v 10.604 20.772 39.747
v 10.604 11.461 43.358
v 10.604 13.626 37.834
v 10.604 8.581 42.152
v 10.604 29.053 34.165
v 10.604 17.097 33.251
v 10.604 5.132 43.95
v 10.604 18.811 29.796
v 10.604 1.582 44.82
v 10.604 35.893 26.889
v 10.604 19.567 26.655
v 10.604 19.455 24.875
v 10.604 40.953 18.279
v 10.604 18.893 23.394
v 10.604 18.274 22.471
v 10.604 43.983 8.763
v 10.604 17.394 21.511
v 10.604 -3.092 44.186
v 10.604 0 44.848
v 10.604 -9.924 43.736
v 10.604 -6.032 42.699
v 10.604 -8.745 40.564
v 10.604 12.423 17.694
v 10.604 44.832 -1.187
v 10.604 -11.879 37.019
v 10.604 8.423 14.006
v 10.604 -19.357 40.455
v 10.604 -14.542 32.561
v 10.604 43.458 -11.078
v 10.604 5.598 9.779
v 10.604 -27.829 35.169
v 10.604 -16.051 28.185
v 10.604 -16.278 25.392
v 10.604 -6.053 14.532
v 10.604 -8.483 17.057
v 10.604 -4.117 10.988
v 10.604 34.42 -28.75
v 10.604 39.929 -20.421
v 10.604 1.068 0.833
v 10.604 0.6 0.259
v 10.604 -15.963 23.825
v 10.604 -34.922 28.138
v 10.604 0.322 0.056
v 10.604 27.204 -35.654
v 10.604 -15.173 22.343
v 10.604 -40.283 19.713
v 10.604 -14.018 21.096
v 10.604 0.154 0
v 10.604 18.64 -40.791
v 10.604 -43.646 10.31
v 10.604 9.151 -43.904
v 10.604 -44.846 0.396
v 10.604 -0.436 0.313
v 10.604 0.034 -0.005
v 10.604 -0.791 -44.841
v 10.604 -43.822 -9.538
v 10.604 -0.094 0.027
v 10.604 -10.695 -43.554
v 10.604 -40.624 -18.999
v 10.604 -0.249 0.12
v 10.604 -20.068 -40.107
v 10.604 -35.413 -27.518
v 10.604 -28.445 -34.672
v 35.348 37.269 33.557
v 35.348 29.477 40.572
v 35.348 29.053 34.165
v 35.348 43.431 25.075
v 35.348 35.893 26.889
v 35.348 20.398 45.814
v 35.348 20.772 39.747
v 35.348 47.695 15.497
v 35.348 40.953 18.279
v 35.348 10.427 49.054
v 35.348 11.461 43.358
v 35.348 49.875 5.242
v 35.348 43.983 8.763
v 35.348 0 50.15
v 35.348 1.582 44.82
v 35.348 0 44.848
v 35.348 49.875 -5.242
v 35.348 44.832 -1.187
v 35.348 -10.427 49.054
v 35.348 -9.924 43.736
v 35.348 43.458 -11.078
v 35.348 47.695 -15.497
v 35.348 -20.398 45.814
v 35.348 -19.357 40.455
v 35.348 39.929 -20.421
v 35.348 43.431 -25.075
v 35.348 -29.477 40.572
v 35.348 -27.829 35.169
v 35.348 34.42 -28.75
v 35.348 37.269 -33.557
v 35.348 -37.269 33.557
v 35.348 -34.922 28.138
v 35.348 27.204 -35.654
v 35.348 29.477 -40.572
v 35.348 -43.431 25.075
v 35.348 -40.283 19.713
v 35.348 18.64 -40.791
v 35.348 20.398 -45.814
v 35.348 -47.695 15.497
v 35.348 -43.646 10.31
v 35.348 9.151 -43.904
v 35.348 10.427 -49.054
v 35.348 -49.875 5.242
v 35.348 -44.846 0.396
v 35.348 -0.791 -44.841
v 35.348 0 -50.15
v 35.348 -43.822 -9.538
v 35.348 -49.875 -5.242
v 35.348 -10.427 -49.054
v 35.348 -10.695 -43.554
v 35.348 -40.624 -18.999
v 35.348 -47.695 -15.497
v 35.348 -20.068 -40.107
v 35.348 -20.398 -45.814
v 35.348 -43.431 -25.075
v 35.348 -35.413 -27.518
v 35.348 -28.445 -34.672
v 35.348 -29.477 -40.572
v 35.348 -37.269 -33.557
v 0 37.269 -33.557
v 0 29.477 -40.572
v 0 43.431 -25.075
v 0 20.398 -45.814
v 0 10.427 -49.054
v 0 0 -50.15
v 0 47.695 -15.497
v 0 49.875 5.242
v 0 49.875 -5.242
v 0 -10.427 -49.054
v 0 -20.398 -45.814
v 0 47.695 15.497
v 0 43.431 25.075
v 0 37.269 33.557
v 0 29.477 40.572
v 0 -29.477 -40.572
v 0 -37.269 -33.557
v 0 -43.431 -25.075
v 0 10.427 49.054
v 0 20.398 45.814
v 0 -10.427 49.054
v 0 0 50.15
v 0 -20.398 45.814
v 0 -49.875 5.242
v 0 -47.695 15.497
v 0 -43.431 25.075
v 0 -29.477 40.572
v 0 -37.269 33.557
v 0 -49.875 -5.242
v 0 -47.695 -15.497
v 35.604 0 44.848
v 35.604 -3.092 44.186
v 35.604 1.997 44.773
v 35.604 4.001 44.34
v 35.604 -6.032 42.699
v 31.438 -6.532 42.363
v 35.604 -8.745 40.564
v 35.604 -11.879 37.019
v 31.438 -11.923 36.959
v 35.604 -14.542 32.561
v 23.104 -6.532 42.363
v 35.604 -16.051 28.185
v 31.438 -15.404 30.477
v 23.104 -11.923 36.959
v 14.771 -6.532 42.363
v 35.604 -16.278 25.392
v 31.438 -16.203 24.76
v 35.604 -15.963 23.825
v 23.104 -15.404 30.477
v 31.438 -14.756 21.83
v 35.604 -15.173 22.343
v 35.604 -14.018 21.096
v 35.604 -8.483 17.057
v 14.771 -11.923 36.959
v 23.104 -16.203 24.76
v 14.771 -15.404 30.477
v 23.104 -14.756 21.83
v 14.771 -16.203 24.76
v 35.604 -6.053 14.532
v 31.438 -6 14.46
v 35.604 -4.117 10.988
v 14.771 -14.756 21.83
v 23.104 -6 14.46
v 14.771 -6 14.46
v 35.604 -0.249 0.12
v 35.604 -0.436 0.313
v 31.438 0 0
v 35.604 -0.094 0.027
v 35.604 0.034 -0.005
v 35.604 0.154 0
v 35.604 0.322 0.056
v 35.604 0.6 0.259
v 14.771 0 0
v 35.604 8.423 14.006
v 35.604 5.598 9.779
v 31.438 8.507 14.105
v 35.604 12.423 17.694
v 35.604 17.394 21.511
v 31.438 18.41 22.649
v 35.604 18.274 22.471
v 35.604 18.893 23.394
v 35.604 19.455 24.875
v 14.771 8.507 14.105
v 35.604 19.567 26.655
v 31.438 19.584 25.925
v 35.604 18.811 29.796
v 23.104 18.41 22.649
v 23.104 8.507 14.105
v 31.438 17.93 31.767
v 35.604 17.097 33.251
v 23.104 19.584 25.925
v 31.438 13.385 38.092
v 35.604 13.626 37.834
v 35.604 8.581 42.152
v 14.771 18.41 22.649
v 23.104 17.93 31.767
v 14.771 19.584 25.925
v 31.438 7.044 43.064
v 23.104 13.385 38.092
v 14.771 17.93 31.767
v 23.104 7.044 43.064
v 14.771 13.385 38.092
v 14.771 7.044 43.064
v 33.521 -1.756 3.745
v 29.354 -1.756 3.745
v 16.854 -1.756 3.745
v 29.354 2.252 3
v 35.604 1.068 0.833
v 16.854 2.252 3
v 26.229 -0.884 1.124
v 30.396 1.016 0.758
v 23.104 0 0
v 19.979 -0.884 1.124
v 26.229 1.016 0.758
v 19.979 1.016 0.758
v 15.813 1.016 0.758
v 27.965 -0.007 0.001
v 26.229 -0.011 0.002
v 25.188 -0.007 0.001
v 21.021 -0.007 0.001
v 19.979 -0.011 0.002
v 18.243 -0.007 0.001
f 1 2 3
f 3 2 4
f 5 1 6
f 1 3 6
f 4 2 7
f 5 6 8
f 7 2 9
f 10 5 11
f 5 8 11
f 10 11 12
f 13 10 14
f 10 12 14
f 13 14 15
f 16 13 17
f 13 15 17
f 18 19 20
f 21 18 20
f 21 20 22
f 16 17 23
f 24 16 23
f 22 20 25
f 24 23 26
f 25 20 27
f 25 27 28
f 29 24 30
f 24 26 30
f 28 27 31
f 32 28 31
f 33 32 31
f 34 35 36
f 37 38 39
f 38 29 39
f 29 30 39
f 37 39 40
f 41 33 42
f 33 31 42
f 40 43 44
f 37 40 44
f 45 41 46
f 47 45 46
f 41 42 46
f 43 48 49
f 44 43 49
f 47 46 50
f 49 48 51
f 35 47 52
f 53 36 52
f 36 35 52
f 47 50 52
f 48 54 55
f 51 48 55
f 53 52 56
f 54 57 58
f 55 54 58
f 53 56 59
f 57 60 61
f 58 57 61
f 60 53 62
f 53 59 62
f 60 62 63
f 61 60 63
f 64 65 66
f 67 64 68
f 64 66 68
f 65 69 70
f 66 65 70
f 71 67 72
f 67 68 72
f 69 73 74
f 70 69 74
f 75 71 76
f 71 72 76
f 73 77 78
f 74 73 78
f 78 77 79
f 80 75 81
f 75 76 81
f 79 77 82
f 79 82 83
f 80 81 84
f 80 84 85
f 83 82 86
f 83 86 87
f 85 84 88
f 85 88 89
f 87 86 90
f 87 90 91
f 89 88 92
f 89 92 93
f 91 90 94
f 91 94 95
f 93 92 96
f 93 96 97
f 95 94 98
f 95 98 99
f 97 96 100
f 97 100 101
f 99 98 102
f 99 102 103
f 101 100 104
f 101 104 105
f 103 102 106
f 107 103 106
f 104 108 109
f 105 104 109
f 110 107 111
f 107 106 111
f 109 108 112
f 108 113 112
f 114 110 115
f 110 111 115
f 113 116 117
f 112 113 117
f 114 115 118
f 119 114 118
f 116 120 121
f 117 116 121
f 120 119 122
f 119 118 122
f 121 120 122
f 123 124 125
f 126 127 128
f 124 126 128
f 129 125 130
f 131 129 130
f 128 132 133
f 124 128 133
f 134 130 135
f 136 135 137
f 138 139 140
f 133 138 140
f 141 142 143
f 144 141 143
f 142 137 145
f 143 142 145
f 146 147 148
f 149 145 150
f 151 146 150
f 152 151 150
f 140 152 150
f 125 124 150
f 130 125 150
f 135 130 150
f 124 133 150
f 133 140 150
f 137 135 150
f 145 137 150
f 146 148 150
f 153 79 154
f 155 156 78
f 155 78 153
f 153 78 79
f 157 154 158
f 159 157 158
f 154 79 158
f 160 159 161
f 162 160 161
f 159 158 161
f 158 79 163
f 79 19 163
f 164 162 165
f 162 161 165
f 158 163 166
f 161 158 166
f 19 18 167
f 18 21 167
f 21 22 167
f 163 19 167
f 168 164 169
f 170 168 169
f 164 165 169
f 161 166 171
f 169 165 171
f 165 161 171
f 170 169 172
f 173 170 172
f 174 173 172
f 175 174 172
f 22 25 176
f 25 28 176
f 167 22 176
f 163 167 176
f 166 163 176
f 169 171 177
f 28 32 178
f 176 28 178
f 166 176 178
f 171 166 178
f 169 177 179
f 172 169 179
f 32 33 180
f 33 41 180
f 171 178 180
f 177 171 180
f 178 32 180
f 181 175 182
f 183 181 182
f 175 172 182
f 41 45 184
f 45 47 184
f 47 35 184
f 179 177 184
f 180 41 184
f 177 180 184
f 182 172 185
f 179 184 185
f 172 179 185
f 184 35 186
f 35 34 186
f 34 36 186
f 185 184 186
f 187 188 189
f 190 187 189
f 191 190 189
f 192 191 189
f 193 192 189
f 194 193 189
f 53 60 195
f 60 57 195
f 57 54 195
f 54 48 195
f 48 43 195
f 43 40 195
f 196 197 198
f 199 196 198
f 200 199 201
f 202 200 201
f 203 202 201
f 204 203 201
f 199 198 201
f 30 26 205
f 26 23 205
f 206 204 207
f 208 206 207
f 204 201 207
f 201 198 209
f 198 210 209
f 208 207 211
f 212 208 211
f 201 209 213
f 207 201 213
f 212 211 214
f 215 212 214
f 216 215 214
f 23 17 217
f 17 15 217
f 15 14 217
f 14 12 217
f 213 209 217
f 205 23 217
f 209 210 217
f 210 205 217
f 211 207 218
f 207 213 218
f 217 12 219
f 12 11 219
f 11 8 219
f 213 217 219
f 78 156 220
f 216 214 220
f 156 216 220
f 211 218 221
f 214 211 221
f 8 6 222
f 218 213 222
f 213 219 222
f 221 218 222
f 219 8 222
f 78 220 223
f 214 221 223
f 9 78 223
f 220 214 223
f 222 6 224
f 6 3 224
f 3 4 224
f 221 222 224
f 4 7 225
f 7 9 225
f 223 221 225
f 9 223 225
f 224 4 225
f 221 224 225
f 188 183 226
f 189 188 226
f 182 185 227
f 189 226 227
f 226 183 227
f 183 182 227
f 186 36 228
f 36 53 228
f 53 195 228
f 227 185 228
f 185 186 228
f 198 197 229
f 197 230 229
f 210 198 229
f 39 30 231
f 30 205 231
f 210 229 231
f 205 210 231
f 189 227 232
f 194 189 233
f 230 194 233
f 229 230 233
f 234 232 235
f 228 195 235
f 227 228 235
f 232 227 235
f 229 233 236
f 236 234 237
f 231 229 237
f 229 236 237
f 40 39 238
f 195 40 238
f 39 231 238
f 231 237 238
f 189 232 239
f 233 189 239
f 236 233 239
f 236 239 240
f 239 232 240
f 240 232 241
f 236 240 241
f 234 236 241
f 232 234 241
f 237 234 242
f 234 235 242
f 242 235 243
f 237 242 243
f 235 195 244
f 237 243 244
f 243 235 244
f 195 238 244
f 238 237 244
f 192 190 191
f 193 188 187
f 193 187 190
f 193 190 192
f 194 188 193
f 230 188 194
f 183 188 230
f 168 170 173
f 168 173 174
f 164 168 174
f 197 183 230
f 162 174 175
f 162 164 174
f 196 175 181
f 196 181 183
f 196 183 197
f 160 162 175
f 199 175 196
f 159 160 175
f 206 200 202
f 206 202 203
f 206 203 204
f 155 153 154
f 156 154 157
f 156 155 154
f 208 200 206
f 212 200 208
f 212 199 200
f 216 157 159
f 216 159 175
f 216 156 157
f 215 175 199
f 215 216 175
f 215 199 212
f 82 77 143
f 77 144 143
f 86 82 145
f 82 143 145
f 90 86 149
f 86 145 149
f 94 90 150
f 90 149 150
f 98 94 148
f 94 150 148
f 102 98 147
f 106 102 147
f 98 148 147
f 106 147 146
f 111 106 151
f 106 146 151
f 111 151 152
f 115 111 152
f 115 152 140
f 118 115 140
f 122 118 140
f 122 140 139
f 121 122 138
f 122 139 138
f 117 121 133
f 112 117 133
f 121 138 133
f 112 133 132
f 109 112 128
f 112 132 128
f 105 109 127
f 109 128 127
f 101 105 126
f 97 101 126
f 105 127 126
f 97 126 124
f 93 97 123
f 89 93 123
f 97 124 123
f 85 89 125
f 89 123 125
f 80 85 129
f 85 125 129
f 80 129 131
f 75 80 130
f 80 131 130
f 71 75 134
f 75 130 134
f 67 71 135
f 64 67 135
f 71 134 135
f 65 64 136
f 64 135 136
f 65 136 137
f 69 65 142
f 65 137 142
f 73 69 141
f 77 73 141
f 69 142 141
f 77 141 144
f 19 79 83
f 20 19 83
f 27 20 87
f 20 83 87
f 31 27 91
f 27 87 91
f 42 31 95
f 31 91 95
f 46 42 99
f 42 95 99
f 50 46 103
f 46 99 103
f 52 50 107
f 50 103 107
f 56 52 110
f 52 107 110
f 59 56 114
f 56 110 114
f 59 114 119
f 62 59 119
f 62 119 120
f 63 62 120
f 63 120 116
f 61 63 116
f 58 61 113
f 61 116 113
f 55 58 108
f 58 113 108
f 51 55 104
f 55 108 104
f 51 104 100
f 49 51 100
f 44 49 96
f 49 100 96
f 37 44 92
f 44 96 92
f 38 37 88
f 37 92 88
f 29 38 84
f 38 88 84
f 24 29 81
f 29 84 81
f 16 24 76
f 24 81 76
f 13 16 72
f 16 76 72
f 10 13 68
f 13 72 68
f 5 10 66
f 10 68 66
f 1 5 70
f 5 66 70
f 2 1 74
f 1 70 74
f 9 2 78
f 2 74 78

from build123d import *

# Parameters (mm, degrees)
F3_DEPTH = 25


with BuildPart() as f1:
    # F0 (on Front) → F1 (revolve)
    with BuildSketch(Plane.XZ):
        Polygon((0, 50.149820745), (0, 0), (10.6043694541, 0), (10.6043694541, 44.8476374149), (35.3478901088, 44.8476374149), (35.3478901088, 50.149820745), align=None)
    revolve(axis=Axis((0, 0, 0), (1, 0, 0)))

    # F2 (on face) → F3 (join)
    with BuildSketch(Plane.YZ.offset(10.6043694541)):
        with BuildLine():
            add(Edge.make_bspline(
                [(0, 44.8476374149), (-9.1265415619, 44.2992200217), (-23.3679723185, 21.1281300087), (-3.2381405586, 18.381144121), (-0.7194922898, -9.1785815317), (6.4144378489, 17.87080484), (27.8238627674, 22.6801088656), (9.3750042169, 45.4109850247), (0, 44.8476374149)],
                knots=[0, 0, 0, 0, 0.1942983175, 0.3399267632, 0.4912543668, 0.6464801915, 0.8004120692, 1, 1, 1, 1], degree=3))
        make_face()
    extrude(amount=F3_DEPTH)


solid = f1.part
